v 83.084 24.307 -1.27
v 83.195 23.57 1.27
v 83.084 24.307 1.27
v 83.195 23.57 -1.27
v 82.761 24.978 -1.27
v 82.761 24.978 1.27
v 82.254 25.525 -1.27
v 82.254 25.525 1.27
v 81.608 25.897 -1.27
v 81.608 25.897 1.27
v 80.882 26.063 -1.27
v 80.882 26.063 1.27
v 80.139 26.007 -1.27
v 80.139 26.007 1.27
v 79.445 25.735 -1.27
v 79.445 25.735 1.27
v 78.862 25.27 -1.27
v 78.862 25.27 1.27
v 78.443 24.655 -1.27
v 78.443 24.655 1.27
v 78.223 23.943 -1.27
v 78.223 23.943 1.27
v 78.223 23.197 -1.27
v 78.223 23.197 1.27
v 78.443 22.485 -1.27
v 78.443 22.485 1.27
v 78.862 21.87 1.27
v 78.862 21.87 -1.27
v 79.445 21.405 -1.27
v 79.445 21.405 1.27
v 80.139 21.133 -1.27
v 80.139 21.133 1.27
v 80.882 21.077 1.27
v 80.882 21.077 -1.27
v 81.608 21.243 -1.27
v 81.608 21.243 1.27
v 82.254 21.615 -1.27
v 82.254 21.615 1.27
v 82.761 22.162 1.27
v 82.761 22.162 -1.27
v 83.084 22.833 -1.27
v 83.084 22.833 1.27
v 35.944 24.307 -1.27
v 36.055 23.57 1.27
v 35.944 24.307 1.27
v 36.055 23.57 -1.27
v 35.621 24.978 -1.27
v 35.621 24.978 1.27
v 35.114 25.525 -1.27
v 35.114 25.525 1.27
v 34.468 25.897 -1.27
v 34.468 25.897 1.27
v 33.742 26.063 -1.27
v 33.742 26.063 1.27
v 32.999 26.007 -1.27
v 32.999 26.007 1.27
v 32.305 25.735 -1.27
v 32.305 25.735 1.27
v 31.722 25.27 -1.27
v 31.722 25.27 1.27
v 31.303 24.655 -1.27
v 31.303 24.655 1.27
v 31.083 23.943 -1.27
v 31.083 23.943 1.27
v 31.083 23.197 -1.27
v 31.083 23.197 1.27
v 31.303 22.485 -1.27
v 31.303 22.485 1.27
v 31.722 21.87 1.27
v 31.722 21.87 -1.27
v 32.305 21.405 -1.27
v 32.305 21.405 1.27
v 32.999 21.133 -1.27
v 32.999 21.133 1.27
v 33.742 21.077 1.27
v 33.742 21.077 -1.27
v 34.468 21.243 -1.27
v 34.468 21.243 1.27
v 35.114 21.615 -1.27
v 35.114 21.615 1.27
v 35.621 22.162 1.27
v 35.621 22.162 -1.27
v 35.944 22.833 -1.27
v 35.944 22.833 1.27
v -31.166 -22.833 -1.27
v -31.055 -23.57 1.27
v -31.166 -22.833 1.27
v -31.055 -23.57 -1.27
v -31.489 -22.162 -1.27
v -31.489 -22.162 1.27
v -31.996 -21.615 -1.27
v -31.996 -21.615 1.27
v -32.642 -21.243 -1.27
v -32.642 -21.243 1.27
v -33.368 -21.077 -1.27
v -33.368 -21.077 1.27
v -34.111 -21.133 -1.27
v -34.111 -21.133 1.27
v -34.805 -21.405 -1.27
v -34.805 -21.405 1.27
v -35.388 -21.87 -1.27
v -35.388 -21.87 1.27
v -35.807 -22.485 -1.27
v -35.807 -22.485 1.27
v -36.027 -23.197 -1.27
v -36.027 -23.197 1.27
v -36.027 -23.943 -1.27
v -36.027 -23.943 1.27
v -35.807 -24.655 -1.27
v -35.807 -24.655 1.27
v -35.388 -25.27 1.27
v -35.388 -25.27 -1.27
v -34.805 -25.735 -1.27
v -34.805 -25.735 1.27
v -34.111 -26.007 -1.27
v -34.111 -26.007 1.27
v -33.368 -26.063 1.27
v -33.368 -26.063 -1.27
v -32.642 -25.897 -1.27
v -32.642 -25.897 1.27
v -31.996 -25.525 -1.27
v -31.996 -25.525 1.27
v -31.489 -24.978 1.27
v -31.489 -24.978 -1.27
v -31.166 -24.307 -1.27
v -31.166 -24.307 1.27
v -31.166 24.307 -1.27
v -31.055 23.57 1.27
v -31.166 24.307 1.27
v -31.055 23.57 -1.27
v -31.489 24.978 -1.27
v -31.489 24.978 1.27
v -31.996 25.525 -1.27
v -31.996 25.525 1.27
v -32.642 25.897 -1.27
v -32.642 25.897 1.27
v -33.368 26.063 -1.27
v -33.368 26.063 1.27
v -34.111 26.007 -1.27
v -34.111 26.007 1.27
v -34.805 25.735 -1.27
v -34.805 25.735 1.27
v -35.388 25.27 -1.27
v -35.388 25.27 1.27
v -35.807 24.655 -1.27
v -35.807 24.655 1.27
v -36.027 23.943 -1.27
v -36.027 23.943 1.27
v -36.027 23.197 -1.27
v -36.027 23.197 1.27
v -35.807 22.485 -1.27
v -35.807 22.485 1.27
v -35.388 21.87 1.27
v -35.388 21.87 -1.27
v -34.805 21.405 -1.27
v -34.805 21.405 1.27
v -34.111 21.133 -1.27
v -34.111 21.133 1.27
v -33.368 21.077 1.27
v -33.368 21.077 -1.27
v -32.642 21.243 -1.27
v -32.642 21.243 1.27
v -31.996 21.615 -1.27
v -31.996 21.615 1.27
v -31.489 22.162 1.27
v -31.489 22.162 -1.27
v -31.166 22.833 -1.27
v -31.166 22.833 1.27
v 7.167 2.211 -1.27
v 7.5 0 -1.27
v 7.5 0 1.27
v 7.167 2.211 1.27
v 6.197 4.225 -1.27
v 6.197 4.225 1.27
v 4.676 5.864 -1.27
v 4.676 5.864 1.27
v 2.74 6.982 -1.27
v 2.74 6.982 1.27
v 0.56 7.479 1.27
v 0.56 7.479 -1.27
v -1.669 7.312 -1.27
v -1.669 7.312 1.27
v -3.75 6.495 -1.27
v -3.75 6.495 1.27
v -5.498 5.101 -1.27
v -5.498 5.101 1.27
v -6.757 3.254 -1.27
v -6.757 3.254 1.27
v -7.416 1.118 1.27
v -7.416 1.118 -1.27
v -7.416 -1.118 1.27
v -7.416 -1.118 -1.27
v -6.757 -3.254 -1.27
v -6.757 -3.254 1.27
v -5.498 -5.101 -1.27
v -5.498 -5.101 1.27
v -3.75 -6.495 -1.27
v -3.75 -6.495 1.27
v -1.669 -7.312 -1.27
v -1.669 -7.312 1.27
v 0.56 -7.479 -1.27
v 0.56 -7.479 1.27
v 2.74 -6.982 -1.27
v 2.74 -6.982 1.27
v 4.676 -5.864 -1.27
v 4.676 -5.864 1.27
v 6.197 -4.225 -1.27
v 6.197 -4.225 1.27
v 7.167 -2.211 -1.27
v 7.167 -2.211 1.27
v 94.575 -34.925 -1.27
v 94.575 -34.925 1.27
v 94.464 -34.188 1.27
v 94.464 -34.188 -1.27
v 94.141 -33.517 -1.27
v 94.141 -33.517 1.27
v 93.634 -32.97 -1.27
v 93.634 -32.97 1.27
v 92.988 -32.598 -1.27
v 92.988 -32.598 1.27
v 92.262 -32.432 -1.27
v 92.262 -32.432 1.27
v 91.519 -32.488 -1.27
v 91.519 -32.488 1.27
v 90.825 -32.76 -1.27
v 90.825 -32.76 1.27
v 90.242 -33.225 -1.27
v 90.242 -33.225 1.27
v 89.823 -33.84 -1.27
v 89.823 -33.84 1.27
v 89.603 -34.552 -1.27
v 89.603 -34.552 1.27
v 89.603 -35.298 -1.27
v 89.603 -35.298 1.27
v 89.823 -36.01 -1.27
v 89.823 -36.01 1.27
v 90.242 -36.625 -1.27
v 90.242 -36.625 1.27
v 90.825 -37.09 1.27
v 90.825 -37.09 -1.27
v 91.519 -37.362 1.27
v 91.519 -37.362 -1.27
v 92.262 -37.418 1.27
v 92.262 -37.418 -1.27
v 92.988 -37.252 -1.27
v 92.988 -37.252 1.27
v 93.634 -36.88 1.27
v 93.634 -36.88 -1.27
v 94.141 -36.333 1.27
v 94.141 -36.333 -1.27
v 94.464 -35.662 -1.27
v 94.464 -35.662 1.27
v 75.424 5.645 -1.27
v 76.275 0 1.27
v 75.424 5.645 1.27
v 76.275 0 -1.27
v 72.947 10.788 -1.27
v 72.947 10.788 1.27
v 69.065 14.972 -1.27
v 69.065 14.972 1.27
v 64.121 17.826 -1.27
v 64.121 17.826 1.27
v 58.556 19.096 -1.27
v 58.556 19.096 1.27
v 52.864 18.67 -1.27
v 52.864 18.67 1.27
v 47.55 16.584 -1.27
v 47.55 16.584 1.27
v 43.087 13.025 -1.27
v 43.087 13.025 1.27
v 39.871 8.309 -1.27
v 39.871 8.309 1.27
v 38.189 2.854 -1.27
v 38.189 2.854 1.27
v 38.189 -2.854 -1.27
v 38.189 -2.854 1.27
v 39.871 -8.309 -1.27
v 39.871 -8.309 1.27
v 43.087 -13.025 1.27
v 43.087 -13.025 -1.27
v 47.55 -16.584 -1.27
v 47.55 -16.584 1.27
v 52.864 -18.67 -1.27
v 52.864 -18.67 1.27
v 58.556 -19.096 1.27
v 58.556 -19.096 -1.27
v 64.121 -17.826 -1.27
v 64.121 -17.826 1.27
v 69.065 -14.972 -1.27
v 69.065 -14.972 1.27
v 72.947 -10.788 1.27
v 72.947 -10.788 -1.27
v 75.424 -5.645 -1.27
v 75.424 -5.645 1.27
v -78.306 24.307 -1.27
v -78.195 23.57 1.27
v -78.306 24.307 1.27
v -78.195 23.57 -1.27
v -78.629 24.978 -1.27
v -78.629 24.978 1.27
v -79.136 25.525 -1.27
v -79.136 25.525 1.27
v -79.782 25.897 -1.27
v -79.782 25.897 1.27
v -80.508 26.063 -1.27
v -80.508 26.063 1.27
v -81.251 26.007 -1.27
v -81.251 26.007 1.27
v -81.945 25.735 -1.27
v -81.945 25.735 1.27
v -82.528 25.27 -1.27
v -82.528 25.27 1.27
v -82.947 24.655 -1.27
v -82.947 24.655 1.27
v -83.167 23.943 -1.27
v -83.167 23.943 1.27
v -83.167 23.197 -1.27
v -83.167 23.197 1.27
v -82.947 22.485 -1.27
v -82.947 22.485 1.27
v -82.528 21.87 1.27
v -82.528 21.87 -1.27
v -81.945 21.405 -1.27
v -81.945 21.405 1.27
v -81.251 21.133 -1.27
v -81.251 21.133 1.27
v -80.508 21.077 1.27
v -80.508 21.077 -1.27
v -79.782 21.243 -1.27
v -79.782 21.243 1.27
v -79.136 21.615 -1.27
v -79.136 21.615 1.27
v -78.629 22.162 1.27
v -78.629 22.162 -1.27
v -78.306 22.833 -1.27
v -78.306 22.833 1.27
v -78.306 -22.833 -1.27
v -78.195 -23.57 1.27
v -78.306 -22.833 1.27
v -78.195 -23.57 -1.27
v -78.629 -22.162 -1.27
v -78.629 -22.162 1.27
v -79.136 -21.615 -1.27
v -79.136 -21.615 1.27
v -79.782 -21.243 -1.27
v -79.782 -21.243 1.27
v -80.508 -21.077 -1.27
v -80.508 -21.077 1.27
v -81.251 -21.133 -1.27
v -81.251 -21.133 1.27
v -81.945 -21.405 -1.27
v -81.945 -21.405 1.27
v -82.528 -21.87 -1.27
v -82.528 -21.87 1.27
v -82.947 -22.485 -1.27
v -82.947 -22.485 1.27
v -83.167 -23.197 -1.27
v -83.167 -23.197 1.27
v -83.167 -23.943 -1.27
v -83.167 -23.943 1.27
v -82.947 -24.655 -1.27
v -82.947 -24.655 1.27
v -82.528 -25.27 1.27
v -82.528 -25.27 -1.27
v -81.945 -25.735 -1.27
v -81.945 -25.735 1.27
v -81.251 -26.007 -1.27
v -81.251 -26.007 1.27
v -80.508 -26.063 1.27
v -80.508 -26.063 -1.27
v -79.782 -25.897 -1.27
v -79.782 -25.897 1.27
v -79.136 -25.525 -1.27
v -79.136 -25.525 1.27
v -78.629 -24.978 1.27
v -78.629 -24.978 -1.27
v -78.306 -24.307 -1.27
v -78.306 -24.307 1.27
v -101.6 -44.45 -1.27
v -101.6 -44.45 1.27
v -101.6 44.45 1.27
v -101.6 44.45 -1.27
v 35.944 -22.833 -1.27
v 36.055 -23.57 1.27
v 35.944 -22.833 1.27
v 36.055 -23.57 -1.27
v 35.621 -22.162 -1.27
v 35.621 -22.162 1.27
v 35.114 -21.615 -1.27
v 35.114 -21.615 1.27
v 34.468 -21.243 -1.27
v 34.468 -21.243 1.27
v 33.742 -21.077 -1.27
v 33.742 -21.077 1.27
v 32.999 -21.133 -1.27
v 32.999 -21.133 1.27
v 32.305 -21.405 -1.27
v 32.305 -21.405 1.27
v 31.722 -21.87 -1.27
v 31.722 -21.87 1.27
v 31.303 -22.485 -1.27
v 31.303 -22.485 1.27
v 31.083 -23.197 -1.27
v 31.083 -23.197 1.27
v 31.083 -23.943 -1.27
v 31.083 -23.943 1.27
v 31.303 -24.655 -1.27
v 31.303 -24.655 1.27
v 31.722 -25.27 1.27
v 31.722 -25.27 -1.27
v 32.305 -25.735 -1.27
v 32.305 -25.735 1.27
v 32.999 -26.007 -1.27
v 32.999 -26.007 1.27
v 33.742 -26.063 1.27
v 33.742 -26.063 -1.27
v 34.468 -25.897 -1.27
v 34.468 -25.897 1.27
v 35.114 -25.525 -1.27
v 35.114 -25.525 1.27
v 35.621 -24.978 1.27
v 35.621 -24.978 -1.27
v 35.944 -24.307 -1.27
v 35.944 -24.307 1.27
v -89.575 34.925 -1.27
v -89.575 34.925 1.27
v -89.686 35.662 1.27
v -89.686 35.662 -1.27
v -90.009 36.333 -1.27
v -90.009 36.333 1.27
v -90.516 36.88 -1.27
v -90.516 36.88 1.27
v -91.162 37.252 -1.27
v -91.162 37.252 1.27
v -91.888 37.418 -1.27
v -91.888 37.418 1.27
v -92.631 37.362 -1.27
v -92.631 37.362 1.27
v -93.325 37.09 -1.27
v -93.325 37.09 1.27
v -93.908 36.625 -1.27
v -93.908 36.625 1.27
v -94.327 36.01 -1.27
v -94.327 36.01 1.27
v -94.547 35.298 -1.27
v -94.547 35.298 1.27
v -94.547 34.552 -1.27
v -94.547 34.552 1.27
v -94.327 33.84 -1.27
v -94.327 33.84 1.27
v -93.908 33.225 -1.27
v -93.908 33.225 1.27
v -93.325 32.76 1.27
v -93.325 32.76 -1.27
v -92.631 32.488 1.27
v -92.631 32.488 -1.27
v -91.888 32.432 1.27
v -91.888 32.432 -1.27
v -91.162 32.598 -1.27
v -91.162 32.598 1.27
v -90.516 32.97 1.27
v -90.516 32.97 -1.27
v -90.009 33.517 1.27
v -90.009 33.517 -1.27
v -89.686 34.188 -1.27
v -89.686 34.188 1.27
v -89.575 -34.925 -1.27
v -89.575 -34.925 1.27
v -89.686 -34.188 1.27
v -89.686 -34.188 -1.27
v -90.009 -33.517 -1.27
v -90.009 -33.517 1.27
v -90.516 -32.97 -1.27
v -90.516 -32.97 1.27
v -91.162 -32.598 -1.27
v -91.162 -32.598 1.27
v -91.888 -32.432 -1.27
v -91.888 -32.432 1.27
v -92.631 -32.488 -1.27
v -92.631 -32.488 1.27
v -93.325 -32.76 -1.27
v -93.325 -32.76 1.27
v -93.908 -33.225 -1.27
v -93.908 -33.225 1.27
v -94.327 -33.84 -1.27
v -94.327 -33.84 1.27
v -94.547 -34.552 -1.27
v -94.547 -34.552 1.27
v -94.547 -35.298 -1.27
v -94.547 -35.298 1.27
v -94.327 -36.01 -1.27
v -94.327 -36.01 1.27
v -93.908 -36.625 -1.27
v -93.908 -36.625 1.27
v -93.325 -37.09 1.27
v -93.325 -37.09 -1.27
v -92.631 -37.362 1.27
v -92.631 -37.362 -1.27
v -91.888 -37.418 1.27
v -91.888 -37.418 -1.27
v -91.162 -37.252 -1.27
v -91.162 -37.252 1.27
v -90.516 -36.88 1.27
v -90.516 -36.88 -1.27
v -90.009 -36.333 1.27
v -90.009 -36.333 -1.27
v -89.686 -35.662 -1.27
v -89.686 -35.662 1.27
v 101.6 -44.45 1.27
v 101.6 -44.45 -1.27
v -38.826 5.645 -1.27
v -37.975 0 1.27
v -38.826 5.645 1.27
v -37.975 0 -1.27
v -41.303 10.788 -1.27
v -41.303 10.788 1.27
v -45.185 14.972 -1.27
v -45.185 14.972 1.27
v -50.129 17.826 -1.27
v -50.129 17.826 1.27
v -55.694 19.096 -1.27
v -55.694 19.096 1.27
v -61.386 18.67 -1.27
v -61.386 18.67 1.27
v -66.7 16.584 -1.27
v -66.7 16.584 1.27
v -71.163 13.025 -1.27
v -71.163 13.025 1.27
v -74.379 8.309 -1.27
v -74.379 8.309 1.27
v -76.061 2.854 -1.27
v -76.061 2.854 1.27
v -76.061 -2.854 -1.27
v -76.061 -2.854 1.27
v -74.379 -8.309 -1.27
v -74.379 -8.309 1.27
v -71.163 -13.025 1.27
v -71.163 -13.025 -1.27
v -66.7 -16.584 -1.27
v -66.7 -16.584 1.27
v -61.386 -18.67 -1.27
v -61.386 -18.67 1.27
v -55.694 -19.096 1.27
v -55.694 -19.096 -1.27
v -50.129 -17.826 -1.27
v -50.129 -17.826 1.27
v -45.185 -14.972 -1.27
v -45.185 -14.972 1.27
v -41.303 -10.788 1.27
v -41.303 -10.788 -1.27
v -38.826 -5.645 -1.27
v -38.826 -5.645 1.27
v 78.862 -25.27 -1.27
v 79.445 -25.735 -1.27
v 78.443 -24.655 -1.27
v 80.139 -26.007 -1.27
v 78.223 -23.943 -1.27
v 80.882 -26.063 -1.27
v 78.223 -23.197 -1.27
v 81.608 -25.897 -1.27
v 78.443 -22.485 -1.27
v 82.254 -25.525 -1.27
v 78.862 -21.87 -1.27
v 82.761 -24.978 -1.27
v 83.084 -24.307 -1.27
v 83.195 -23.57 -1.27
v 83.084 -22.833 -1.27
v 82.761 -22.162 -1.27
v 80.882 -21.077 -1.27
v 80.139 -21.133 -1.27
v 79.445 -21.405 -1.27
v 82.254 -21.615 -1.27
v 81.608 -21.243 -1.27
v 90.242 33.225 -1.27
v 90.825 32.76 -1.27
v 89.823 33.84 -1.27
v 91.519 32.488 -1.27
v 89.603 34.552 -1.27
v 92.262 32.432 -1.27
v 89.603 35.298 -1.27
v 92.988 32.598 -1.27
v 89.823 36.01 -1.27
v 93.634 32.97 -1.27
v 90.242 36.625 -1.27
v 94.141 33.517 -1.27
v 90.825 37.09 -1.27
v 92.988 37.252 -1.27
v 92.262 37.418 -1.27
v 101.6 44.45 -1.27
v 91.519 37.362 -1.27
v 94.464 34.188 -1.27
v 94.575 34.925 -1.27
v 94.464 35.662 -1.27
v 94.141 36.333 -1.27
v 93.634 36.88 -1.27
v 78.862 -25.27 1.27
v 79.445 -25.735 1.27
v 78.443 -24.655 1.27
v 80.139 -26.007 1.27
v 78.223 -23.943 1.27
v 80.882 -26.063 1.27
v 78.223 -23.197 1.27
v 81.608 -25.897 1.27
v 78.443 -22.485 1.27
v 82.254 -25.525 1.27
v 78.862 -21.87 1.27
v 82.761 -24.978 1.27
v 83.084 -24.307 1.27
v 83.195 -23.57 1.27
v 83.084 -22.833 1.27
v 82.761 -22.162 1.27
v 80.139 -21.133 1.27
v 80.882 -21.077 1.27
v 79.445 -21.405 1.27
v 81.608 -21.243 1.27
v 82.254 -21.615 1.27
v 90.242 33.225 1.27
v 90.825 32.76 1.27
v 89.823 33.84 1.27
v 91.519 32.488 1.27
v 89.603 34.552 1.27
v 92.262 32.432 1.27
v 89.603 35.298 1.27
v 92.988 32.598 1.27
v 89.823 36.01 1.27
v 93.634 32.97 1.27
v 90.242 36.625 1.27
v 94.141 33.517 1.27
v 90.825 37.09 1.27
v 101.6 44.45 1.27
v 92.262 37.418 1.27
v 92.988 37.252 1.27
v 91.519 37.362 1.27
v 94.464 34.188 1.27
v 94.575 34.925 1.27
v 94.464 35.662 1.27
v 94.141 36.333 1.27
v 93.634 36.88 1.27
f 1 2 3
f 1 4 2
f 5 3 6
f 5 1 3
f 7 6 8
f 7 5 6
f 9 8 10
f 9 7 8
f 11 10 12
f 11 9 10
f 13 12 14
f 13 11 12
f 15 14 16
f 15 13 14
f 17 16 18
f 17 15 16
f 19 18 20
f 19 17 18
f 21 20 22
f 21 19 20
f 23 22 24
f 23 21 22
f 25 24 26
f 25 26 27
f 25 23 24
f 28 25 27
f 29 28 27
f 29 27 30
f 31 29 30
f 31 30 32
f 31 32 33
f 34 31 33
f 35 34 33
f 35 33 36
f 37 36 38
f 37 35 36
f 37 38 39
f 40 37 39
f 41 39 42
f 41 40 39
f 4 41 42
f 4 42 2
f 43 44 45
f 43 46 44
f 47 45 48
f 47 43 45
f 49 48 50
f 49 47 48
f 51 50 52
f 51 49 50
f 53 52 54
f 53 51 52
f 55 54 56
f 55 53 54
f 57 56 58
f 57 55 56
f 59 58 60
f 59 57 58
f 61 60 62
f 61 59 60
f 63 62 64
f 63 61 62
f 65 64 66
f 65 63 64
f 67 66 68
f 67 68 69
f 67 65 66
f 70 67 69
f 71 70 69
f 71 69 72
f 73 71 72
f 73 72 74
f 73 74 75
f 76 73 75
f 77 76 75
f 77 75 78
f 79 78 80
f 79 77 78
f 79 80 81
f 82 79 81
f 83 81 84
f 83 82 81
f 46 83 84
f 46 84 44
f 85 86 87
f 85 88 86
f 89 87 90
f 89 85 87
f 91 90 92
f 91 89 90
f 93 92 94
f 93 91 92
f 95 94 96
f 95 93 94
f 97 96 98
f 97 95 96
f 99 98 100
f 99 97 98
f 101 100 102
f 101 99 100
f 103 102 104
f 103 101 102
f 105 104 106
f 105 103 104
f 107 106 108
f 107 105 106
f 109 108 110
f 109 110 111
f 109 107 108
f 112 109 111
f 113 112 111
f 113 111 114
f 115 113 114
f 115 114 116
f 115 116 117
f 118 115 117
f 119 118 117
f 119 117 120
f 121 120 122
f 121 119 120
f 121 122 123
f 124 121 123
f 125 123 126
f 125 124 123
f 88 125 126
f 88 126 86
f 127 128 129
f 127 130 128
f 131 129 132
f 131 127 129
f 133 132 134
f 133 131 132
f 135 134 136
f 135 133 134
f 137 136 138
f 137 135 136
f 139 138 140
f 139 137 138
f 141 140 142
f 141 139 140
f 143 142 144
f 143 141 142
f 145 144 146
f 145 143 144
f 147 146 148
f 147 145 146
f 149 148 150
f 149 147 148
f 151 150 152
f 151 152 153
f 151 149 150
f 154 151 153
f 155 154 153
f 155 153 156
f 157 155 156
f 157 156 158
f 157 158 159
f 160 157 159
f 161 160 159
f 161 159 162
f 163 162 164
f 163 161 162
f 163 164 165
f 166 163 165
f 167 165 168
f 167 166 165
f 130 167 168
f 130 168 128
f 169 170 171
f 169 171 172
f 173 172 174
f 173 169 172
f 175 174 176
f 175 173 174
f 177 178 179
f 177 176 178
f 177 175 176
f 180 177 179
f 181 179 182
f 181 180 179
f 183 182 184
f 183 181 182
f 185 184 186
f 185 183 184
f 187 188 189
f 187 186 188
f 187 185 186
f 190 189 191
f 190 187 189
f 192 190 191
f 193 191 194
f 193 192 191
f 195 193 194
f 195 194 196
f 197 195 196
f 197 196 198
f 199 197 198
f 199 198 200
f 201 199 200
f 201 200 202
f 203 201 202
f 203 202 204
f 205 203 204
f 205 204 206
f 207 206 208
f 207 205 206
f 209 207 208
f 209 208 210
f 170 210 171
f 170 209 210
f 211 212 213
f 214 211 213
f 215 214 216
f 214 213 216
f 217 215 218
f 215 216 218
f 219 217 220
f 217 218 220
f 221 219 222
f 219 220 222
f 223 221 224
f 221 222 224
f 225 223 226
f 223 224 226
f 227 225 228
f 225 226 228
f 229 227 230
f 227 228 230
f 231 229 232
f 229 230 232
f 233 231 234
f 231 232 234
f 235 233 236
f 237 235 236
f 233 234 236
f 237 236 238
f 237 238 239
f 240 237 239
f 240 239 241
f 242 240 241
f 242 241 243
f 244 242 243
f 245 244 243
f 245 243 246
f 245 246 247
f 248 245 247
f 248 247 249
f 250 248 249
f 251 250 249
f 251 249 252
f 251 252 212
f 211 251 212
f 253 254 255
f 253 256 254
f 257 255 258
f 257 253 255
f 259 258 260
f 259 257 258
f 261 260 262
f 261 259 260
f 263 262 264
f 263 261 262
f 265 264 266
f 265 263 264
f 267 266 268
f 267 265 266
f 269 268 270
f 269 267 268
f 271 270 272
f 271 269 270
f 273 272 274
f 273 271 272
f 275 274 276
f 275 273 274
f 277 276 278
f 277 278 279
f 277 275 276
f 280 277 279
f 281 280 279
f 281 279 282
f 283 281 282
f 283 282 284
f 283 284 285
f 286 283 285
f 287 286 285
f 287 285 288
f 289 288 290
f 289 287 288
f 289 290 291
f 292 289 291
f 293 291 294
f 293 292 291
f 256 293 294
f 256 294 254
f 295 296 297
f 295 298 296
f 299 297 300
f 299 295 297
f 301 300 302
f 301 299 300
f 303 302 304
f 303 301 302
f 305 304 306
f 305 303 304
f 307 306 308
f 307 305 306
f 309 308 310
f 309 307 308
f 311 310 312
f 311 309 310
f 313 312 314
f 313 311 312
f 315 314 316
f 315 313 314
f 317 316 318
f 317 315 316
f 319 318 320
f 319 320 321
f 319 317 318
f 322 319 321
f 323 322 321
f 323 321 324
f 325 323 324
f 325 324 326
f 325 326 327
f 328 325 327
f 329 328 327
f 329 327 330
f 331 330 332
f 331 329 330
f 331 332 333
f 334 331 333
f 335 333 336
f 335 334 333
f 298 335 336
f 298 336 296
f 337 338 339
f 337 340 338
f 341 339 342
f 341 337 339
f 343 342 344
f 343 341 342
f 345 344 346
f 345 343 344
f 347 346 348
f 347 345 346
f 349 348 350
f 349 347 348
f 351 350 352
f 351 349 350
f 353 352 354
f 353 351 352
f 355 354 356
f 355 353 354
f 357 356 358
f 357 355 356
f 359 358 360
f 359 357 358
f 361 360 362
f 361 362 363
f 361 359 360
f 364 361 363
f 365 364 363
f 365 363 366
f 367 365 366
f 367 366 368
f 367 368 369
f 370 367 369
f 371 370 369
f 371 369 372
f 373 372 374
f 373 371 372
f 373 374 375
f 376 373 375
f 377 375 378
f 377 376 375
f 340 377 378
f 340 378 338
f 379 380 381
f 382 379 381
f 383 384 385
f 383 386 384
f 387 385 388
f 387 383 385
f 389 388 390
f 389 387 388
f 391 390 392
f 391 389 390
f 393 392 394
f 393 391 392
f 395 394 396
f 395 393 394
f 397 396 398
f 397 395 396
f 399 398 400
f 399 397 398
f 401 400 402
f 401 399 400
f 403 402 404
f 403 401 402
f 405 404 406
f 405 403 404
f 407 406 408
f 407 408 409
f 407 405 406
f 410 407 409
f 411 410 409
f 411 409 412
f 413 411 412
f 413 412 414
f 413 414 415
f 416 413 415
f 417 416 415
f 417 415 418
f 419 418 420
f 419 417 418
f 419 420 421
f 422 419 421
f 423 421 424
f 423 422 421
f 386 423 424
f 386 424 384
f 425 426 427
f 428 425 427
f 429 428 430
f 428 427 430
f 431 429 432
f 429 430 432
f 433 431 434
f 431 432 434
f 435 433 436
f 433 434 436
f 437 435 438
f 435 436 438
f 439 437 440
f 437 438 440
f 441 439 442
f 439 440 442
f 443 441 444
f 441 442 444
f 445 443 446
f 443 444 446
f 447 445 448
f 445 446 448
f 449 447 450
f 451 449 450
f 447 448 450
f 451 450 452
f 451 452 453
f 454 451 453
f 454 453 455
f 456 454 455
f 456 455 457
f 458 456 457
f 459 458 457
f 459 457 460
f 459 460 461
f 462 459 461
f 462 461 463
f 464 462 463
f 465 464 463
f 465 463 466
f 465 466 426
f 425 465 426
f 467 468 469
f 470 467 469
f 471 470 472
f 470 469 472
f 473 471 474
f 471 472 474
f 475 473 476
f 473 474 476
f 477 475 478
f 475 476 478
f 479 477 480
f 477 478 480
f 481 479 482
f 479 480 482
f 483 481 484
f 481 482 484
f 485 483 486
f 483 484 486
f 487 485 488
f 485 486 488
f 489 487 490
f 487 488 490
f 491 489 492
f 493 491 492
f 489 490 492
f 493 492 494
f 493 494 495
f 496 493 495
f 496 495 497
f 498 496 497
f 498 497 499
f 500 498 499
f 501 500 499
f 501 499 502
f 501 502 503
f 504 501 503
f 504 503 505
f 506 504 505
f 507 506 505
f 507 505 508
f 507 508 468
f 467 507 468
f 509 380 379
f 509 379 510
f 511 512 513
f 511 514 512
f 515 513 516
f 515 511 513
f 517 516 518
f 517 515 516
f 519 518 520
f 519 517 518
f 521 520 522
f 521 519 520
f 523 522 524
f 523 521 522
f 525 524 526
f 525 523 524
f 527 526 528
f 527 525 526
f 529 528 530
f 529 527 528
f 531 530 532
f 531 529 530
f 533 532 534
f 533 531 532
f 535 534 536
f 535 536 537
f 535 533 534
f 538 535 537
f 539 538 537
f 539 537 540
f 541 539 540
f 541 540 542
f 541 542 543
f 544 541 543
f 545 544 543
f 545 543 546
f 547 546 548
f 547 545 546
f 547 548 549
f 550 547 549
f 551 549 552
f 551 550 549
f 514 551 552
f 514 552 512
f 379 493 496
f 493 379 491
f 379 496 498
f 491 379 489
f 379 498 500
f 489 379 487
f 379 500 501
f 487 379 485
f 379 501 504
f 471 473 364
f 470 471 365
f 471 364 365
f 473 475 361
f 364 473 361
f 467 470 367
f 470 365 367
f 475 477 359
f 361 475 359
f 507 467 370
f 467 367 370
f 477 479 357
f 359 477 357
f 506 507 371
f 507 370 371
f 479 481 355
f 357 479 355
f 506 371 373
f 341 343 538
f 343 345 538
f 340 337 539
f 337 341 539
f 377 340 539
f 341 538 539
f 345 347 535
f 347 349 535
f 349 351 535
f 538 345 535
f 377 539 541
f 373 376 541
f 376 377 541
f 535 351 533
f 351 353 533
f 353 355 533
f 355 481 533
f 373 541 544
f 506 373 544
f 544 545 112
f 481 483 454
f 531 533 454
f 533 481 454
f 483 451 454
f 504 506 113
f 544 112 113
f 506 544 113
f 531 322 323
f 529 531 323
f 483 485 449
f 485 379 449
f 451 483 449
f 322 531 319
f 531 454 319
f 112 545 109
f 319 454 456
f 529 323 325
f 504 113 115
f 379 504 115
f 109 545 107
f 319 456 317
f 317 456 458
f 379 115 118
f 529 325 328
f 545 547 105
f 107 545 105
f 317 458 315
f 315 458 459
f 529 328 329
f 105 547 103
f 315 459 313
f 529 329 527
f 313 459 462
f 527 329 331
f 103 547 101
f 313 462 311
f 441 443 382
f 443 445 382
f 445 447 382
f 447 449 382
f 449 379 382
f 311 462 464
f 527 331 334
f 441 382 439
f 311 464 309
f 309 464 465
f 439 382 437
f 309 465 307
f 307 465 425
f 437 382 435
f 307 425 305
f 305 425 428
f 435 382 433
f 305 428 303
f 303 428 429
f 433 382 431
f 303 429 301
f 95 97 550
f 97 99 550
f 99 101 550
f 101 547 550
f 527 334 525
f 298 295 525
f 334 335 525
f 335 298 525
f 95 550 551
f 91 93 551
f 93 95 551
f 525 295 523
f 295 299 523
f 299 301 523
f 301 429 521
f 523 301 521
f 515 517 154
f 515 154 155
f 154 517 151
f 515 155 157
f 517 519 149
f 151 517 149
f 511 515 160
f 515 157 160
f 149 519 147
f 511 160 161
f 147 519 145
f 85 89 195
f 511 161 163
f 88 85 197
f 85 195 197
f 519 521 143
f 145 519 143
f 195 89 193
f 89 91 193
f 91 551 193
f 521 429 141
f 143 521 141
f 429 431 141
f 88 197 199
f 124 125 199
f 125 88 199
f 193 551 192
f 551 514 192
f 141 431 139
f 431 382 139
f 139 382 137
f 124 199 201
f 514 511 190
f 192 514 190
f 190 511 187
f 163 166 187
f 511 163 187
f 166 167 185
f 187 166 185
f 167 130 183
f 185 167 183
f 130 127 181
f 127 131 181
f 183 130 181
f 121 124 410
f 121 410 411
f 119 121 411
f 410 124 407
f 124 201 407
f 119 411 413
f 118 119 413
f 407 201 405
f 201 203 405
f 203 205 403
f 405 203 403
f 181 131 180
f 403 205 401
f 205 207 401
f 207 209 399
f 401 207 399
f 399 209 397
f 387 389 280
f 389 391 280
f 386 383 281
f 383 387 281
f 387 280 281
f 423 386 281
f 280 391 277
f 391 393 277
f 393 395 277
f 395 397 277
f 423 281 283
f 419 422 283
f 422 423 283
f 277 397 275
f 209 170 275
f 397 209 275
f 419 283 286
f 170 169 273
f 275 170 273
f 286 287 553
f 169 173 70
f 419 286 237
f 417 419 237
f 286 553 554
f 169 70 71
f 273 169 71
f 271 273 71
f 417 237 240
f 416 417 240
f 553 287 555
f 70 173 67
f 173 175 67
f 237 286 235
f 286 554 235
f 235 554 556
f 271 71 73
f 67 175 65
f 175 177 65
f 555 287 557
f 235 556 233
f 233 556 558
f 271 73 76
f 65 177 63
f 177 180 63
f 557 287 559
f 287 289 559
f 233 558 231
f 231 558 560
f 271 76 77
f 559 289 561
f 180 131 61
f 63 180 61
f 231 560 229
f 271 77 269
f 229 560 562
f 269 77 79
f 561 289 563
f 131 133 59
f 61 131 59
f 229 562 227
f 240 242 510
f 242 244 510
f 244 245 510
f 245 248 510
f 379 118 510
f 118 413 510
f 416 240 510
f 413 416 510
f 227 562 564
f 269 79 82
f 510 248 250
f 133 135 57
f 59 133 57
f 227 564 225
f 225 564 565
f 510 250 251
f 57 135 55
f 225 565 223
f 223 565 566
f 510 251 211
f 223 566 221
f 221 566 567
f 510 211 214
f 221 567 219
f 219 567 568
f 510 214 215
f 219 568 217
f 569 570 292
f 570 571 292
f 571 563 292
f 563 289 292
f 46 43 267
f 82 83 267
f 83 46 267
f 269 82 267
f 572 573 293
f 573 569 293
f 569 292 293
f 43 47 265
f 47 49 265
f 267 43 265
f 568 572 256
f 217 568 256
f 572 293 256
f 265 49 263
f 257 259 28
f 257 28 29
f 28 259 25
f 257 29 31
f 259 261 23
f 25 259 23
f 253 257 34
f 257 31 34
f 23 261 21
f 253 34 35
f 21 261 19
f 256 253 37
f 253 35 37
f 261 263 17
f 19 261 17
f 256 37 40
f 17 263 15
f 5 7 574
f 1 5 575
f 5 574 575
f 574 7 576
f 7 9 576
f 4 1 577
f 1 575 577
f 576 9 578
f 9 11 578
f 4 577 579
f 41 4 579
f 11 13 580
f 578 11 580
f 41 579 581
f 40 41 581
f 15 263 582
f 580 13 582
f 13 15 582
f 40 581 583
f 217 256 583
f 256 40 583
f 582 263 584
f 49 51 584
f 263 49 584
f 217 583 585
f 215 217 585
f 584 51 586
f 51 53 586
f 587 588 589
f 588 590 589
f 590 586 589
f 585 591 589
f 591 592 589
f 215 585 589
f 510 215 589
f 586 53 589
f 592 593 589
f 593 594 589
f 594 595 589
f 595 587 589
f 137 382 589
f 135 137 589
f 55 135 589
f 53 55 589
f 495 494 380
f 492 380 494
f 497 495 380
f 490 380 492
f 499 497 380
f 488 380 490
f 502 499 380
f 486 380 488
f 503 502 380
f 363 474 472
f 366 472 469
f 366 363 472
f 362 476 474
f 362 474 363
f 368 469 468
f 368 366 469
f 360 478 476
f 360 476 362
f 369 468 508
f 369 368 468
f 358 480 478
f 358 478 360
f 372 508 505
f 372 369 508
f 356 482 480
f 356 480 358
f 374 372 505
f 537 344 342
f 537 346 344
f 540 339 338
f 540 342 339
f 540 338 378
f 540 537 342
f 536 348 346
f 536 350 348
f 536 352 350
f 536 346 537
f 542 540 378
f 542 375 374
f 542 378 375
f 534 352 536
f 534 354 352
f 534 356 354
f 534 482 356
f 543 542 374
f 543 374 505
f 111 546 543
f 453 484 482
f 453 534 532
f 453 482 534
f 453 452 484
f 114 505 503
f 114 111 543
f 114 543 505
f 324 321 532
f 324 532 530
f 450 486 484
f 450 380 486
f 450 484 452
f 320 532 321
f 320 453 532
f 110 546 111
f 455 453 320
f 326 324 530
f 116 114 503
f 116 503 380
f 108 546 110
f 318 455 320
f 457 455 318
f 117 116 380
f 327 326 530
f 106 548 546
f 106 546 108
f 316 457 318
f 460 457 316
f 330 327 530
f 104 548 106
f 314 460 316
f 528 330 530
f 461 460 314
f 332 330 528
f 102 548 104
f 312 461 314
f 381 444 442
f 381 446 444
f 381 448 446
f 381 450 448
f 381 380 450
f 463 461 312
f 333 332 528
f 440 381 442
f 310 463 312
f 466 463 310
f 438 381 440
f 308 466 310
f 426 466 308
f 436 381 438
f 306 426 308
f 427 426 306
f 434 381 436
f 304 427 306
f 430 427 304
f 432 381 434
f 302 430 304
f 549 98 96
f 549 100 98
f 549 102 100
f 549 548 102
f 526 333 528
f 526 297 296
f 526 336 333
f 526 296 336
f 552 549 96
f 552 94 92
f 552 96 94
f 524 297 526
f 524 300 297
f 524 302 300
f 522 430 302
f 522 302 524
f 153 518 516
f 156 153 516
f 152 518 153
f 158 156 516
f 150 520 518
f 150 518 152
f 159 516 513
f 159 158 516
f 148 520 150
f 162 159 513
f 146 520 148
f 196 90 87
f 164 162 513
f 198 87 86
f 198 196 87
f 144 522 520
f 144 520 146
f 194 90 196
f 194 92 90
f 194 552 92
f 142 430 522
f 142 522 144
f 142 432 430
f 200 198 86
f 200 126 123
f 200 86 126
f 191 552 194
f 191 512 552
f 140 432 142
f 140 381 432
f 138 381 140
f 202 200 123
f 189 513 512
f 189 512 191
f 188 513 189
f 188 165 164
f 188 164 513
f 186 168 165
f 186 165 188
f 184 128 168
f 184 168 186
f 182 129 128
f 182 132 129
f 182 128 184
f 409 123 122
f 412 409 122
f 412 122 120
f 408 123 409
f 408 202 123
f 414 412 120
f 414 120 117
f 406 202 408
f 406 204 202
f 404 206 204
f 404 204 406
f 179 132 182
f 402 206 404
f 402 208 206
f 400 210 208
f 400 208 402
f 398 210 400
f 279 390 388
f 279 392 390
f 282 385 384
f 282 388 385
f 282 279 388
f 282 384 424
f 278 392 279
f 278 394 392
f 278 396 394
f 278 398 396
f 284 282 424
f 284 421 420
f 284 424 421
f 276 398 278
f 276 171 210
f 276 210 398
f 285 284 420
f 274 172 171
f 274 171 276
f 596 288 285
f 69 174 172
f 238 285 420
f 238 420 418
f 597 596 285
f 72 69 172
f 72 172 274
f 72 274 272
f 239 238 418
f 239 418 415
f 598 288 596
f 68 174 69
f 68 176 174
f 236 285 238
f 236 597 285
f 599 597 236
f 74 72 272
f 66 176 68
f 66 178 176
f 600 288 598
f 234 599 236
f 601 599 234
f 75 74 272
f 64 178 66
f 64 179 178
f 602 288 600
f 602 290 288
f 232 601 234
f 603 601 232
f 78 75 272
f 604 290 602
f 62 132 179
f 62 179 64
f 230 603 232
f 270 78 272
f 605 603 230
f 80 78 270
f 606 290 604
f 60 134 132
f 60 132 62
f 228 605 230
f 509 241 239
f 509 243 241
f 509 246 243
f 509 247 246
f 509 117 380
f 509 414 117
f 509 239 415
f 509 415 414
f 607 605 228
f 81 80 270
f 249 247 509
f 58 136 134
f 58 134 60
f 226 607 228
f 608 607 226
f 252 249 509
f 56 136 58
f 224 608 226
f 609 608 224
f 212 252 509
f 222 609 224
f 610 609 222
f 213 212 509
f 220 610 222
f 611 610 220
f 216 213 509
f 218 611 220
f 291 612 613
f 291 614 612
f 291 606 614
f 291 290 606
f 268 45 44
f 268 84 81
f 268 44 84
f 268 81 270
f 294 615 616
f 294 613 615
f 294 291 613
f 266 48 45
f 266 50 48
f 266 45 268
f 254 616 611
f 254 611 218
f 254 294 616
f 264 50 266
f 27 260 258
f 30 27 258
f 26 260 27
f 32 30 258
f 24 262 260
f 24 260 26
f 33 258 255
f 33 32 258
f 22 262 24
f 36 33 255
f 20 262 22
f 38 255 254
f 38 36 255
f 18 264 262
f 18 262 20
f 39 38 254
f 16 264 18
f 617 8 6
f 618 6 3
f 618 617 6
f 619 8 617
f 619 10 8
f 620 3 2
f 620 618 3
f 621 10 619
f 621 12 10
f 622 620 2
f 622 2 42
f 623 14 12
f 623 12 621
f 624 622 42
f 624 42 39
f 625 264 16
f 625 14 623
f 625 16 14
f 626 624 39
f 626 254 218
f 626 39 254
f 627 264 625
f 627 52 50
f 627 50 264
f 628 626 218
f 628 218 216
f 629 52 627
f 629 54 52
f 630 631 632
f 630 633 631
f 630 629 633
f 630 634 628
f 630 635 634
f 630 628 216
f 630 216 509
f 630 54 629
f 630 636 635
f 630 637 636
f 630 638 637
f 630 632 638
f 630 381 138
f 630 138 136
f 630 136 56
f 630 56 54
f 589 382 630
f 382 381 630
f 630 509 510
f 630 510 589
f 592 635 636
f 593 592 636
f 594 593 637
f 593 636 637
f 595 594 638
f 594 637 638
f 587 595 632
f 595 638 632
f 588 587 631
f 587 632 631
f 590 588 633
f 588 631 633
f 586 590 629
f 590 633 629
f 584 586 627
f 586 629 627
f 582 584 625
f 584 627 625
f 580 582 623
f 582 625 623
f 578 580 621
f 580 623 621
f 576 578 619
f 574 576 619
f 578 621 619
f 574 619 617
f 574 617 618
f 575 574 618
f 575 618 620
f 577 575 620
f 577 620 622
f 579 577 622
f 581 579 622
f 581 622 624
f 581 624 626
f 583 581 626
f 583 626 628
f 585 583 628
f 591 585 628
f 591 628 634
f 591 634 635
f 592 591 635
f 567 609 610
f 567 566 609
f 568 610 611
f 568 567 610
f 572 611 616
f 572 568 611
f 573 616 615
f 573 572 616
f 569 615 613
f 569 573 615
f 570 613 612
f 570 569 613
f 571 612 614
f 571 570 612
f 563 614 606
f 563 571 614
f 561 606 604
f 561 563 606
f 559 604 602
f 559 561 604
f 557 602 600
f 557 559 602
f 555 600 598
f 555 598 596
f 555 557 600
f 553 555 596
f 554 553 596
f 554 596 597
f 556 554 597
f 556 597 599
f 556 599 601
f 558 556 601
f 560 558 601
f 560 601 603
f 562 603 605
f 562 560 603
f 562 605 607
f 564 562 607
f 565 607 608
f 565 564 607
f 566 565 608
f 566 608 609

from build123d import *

# Parameters (mm, degrees)
SKETCH2_W               = 203.2
SKETCH2_H               = 88.9
SKETCH2_R               = 2.5
SKETCH2_R_2             = 19.15
BOSS_EXTRUDE1_DEPTH     = 1.27
SKETCH3_R               = 2.5
CUT_EXTRUDE1_DEPTH      = 111.92706658
CUT_EXTRUDE2_DEPTH      = 111.92706658
CUT_EXTRUDE2_DEPTH_BACK = 111.92706658
SKETCH4_R               = 7.5


with BuildPart() as part:
    # Sketch2 → Boss-Extrude1 (new, symmetric)
    with BuildSketch(Plane.XY):
        Rectangle(SKETCH2_W, SKETCH2_H)
        with Locations((-80.695, -23.57)):
            Circle(SKETCH2_R, mode=Mode.SUBTRACT)
        with Locations((-33.555, -23.57)):
            Circle(SKETCH2_R, mode=Mode.SUBTRACT)
        with Locations((-33.555, 23.57)):
            Circle(SKETCH2_R, mode=Mode.SUBTRACT)
        with Locations((-80.695, 23.57)):
            Circle(SKETCH2_R, mode=Mode.SUBTRACT)
        with Locations((33.555, 23.57)):
            Circle(SKETCH2_R, mode=Mode.SUBTRACT)
        with Locations((80.695, 23.57)):
            Circle(SKETCH2_R, mode=Mode.SUBTRACT)
        with Locations((33.555, -23.57)):
            Circle(SKETCH2_R, mode=Mode.SUBTRACT)
        with Locations((80.695, -23.57)):
            Circle(SKETCH2_R, mode=Mode.SUBTRACT)
        with Locations((-57.125, 0)):
            Circle(SKETCH2_R_2, mode=Mode.SUBTRACT)
        with Locations((57.125, 0)):
            Circle(SKETCH2_R_2, mode=Mode.SUBTRACT)
    extrude(amount=BOSS_EXTRUDE1_DEPTH, both=True)

    # Sketch3 → Cut-Extrude1 (cut, through all)
    with BuildSketch(Plane.XY.offset(1.27)):
        with Locations((-92.075, 34.925)):
            Circle(SKETCH3_R)
        with Locations((-92.075, -34.925)):
            Circle(SKETCH3_R)
        with Locations((92.075, -34.925)):
            Circle(SKETCH3_R)
        with Locations((92.075, 34.925)):
            Circle(SKETCH3_R)
    extrude(amount=-CUT_EXTRUDE1_DEPTH, mode=Mode.SUBTRACT)

    # Sketch4 → Cut-Extrude2 (cut, two sides: drawn at the far end of the back side and taken through both)
    with BuildSketch(Plane.XY.offset(1.27).offset(-CUT_EXTRUDE2_DEPTH_BACK)):
        Circle(SKETCH4_R)
    extrude(amount=CUT_EXTRUDE2_DEPTH + CUT_EXTRUDE2_DEPTH_BACK, mode=Mode.SUBTRACT)


solid = part.part
